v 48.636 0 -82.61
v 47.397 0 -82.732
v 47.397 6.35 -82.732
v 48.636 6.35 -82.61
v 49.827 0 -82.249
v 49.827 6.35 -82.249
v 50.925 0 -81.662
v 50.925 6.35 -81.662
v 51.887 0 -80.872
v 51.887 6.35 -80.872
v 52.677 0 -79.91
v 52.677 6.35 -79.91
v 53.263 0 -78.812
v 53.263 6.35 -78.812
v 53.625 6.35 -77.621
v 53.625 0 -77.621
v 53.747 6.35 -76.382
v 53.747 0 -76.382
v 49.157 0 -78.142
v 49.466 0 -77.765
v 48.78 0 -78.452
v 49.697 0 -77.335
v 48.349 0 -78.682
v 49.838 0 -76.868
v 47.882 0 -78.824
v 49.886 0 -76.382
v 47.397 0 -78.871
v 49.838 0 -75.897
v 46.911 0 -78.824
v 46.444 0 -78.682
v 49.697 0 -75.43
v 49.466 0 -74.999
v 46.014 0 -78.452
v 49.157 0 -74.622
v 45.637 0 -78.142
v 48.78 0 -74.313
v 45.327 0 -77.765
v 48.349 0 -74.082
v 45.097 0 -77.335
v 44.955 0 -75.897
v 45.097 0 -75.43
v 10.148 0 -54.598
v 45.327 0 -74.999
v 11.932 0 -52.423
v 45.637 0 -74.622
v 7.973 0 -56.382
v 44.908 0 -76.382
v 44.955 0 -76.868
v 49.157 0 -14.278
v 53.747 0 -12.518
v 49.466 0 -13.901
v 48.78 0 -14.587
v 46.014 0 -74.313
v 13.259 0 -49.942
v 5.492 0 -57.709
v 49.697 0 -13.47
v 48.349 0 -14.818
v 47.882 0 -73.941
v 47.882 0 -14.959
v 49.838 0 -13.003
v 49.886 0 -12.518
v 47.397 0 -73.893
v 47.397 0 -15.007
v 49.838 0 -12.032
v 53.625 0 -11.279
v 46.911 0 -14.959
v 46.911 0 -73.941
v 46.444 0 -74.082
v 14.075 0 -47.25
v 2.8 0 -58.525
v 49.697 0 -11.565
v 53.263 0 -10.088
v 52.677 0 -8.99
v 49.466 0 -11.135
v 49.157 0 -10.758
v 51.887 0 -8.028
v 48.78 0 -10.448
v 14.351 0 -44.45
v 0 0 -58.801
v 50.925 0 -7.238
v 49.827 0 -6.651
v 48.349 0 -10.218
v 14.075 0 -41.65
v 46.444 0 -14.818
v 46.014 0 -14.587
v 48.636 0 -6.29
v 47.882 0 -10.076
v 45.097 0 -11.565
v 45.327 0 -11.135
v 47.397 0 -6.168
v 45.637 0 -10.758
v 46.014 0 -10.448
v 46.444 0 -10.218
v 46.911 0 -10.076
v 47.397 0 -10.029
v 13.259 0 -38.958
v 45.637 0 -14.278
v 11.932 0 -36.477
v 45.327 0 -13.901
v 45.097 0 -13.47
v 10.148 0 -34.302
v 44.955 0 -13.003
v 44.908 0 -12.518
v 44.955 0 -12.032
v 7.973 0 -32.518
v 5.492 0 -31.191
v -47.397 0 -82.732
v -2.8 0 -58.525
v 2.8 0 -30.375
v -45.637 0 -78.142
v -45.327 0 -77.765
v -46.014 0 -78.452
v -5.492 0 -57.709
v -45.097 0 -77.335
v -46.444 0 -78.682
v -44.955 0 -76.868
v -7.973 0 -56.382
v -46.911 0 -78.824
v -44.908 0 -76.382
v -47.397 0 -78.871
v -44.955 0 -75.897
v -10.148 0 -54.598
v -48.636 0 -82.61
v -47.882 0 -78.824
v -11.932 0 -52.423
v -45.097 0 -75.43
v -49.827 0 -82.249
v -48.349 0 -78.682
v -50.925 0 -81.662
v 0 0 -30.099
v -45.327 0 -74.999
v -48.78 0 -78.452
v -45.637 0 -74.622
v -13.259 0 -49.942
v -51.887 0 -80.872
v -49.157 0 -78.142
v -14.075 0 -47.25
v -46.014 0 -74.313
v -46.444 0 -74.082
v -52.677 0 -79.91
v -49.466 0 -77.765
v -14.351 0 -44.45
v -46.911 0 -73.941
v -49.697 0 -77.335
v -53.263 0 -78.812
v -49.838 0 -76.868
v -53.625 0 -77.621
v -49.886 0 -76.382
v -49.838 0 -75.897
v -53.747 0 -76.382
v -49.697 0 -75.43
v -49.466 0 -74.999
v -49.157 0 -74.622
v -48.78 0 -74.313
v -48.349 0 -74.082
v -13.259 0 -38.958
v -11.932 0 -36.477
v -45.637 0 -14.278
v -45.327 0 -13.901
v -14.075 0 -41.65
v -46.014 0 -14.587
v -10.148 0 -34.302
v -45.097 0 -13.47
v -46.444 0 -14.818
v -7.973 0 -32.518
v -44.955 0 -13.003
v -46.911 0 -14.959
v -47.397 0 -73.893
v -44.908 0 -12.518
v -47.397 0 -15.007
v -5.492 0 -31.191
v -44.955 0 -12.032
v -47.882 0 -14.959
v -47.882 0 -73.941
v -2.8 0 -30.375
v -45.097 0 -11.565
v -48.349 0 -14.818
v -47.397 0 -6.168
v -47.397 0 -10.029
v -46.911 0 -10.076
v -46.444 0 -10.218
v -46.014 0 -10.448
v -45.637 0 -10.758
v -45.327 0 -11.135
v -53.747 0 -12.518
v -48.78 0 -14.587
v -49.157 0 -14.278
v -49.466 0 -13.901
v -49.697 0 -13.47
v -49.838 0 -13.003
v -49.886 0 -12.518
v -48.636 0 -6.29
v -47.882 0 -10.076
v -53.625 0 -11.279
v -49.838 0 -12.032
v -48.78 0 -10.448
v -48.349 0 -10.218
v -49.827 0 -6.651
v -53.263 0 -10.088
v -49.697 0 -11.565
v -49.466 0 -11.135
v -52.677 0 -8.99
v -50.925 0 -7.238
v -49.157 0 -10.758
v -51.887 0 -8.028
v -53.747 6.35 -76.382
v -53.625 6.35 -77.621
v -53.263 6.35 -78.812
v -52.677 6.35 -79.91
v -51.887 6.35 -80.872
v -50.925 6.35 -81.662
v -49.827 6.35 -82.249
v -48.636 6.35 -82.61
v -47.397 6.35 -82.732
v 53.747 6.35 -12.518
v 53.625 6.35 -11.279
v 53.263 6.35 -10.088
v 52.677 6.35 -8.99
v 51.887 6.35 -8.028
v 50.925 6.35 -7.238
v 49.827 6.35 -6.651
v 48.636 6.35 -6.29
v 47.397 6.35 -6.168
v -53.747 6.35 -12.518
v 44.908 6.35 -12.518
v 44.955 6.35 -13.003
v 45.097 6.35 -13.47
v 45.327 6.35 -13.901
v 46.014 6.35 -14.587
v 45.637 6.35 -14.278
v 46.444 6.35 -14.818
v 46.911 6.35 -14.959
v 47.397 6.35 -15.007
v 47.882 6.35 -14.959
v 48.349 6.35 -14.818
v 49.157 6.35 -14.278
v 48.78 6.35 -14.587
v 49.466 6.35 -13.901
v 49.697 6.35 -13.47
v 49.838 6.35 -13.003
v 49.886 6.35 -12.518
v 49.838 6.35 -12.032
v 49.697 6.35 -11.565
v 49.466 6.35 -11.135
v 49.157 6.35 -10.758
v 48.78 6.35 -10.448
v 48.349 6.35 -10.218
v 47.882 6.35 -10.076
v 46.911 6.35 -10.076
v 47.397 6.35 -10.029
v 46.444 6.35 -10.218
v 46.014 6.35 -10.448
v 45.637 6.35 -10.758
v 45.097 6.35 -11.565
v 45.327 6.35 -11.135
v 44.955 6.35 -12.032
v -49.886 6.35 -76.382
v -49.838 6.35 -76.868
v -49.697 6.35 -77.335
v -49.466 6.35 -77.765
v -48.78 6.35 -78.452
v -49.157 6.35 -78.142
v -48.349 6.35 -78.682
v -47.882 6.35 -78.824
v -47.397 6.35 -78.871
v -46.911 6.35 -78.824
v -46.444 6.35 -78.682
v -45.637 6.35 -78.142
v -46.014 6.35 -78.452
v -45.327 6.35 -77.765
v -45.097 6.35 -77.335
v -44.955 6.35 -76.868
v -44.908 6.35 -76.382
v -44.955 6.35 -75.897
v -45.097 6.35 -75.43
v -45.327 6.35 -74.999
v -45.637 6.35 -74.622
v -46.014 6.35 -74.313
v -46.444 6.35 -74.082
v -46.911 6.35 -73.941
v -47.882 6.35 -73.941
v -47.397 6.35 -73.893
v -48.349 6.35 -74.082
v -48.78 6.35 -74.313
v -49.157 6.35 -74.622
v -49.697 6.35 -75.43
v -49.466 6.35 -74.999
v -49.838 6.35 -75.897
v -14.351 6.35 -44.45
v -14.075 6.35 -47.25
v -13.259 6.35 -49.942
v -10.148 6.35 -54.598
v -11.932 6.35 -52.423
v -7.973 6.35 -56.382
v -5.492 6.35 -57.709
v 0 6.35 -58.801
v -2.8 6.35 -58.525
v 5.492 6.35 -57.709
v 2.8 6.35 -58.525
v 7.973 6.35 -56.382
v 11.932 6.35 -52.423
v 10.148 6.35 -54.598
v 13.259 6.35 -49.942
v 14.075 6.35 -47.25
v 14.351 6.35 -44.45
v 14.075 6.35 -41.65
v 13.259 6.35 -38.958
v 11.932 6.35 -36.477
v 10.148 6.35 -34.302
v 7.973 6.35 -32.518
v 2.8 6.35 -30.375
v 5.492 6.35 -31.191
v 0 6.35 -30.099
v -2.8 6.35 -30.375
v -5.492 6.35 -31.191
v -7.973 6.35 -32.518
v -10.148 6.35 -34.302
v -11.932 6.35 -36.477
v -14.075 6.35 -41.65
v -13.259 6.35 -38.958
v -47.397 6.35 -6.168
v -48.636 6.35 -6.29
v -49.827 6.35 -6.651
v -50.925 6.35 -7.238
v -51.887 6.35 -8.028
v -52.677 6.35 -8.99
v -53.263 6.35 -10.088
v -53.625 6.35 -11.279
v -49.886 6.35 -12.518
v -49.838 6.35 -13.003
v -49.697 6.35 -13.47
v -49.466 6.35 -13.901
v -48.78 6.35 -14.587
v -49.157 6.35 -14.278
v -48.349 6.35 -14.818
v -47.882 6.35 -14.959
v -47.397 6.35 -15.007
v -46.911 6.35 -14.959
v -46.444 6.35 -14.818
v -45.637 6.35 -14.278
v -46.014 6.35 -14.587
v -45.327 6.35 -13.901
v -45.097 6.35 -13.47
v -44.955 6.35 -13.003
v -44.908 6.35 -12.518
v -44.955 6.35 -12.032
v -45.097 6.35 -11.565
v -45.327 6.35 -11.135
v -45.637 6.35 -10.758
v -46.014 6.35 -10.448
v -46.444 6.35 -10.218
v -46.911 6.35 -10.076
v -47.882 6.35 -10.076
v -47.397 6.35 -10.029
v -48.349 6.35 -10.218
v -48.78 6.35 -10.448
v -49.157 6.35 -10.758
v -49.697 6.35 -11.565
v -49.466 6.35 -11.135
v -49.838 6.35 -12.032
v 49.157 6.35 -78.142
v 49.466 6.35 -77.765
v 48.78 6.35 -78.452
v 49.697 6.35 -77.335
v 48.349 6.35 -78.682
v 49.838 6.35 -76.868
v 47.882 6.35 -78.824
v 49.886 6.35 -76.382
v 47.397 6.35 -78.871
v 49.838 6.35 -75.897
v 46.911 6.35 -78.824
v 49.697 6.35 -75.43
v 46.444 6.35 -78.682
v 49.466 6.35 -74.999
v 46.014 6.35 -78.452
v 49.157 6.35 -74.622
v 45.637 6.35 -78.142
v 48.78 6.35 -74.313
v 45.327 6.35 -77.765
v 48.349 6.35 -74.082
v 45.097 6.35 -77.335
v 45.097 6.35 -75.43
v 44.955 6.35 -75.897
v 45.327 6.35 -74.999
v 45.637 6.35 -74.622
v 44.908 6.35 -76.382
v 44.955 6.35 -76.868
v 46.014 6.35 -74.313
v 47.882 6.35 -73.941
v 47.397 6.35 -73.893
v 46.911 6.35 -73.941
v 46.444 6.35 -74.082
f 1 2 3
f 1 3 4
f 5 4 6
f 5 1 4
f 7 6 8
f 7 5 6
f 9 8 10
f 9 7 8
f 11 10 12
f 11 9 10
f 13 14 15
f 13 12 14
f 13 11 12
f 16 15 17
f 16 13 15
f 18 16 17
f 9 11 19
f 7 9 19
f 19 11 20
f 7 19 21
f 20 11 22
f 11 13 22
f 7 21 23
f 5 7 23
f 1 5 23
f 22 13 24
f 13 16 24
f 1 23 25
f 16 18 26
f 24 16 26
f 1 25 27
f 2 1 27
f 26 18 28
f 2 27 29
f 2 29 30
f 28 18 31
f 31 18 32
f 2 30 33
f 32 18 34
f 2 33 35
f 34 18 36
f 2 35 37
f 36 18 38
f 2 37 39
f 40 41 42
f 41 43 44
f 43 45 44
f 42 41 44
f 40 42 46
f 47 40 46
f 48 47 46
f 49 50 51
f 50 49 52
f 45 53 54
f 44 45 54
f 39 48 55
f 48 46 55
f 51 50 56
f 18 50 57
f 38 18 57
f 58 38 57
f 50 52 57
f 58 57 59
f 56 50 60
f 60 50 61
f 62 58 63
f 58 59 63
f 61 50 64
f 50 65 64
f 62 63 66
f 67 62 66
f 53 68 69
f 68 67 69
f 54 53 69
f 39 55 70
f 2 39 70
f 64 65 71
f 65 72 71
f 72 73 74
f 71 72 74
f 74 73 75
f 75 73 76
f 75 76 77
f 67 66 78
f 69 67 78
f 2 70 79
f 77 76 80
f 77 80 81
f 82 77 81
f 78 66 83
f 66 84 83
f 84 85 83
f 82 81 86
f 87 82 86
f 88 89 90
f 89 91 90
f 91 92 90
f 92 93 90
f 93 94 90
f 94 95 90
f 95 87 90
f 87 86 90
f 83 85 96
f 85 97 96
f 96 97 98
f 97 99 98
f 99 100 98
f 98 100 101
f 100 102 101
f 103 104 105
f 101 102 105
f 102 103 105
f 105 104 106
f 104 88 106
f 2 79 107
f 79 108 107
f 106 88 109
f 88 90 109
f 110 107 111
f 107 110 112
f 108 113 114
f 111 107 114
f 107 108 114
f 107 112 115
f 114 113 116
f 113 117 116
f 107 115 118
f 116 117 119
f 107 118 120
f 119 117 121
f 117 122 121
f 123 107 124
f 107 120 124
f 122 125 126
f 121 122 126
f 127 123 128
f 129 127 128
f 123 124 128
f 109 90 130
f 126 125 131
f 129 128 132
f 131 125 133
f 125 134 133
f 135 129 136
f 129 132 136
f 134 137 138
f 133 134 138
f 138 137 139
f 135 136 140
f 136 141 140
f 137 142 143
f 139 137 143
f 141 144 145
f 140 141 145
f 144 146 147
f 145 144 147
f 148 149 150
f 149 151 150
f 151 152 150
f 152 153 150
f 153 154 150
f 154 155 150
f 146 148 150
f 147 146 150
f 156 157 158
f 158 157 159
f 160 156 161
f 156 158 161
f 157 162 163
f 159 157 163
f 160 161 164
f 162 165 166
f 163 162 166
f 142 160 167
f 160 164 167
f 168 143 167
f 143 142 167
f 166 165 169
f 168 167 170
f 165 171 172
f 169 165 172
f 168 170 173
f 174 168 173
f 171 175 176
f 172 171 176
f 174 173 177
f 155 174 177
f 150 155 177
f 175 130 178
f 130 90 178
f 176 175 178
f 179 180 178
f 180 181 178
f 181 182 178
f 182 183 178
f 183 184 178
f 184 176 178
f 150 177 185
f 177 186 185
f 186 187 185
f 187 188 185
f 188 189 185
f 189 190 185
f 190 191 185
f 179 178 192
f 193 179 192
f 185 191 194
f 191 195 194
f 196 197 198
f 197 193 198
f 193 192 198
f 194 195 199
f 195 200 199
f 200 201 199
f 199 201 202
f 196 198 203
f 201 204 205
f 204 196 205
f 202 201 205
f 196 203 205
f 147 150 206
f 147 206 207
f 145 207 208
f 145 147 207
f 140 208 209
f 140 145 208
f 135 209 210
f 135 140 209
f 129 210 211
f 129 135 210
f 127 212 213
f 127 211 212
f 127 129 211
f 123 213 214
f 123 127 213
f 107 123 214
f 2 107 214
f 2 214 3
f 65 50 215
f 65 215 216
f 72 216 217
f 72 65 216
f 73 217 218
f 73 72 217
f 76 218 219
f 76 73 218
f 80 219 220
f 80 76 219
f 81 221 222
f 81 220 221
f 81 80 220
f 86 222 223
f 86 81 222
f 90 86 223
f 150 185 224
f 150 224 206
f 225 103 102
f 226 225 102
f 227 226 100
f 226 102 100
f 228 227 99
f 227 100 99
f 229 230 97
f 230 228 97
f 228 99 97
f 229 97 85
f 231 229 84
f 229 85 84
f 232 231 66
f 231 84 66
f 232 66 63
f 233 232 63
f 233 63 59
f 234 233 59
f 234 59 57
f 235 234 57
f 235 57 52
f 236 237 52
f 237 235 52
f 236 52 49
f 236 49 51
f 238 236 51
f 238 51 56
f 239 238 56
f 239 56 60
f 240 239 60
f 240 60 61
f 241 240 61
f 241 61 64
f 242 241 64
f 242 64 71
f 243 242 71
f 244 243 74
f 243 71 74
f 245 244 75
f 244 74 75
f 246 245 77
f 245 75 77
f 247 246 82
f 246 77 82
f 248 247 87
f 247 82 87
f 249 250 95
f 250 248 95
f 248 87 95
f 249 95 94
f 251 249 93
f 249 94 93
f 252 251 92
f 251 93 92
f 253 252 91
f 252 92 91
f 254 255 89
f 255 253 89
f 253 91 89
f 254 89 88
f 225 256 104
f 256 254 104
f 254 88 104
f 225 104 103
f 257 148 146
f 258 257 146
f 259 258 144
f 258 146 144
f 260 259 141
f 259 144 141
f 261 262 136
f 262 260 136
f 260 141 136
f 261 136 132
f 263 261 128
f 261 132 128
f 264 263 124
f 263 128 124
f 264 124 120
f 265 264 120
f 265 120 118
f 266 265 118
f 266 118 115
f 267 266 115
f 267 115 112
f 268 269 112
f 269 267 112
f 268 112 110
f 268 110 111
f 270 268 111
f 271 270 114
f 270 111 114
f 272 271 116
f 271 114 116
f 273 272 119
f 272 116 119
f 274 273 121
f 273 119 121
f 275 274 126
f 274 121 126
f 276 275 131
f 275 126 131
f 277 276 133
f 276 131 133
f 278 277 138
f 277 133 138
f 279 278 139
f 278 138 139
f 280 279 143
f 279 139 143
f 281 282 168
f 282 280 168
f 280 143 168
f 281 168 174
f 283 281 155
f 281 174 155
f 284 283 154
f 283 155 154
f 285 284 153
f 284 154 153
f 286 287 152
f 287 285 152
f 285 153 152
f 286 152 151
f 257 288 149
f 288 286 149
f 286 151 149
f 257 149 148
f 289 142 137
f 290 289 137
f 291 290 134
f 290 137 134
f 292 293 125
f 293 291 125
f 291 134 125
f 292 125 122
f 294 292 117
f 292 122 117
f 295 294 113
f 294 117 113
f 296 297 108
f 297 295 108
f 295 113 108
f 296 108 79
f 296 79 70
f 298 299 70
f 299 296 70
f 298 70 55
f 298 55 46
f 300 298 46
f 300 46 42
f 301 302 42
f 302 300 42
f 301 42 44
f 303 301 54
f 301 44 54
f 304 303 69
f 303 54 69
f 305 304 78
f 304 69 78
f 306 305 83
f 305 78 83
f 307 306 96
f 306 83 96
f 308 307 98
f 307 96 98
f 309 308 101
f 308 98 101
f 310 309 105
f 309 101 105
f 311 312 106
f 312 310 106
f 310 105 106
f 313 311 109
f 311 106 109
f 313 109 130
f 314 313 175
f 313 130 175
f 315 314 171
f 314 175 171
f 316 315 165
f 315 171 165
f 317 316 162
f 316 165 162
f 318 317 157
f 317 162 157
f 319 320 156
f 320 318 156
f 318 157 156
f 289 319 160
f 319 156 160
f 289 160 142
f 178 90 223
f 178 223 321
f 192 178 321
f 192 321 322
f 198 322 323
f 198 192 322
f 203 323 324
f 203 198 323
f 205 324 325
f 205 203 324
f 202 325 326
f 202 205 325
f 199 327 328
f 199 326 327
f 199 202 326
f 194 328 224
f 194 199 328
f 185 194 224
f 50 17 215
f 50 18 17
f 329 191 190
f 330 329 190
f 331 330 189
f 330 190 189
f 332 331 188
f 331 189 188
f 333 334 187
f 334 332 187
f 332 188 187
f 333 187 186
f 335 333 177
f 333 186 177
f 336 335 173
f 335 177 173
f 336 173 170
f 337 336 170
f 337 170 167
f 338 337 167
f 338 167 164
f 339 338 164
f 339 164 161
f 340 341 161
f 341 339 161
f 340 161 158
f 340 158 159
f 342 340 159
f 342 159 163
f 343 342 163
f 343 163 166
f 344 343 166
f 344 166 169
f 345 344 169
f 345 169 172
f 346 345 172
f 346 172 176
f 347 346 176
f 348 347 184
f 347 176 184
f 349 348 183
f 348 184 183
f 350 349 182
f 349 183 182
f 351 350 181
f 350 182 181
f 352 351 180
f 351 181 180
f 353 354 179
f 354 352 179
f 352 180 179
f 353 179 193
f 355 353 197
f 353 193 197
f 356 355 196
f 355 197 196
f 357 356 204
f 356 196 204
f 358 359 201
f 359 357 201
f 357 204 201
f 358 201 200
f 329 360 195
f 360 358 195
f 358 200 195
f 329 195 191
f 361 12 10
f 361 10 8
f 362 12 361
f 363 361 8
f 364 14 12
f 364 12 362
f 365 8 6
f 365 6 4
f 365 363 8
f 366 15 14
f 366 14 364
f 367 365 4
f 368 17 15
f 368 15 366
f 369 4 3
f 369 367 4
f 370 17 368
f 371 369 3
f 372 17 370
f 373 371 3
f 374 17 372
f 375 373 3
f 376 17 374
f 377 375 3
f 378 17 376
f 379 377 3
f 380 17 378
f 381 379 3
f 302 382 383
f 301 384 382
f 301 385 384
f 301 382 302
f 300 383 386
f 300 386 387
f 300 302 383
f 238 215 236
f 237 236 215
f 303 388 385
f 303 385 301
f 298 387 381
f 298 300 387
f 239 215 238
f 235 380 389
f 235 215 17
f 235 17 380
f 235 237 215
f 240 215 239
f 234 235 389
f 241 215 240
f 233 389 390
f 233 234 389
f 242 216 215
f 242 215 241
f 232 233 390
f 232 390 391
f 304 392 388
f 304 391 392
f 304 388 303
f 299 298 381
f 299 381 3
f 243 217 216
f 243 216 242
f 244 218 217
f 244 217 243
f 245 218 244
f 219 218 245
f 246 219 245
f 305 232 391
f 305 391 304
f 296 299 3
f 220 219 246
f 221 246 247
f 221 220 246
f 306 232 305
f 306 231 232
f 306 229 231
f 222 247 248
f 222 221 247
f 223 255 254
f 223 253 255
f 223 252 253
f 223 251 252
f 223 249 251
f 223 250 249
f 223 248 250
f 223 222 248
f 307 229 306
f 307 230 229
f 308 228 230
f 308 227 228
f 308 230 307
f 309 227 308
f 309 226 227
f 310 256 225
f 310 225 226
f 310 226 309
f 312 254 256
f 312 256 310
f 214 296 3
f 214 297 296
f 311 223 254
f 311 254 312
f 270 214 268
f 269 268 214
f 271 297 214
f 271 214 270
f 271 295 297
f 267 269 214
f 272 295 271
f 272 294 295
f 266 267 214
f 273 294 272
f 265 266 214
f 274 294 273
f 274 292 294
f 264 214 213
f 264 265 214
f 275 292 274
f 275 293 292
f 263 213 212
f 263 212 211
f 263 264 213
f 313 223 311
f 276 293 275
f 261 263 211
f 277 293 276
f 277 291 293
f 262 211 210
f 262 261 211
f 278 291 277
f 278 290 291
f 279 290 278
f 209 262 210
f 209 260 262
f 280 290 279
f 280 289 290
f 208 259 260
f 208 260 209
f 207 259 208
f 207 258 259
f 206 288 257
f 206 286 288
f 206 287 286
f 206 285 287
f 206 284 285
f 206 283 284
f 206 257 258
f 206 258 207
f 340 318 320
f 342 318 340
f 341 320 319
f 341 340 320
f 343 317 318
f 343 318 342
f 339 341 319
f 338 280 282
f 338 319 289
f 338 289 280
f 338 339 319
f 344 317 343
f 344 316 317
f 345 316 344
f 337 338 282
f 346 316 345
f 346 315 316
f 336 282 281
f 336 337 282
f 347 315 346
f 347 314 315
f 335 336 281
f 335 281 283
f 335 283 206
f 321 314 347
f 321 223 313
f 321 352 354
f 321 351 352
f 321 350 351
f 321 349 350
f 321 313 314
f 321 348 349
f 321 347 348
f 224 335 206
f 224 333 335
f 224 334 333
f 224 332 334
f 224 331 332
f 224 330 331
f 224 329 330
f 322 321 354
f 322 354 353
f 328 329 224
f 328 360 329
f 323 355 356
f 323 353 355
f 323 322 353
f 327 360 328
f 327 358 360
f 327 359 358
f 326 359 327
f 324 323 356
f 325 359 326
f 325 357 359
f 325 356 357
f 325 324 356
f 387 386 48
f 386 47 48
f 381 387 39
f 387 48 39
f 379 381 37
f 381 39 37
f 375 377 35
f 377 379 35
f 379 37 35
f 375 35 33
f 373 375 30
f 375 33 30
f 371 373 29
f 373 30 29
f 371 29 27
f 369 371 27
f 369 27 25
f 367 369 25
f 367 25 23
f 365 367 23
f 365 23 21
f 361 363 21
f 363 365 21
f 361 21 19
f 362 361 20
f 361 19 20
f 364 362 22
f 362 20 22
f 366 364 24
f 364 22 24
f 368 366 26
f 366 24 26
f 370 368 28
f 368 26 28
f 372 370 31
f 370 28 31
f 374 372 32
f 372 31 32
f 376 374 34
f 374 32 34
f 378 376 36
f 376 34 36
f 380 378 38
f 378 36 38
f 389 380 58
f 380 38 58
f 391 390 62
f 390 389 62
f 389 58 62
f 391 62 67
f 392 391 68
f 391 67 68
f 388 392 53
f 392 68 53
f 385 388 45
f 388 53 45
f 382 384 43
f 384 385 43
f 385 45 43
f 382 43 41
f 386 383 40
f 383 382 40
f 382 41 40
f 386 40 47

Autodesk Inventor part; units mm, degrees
ref_plane "YZ Plane" through (0, 0, 0) normal (1, 0, 0) x (0, 1, 0)
ref_plane "XZ Plane" through (0, 0, 0) normal (0, 1, 0) x (-1, 0, 0)
ref_plane "XY Plane" through (0, 0, 0) normal (0, 0, 1) x (1, 0, 0)
sketch "Sketch1" plane through (0, 0, 0) normal (0, 1, 0) x (-1, 0, 0)
  point P0 (0, 0)
sketch "Sketch2" plane through (0, 0, 0) normal (0, 1, 0) x (-1, 0, 0)
  circle A0 centre (0, 0) radius 6.35 construction
  circle A1 centre (0, -44.45) radius 38.1 construction
  circle A2 centre (0, 0) radius 25.4 construction
  circle A3 centre (17.9605, -17.9605) radius 2.4892 construction
  circle A4 centre (25.4, 0) radius 2.4892 construction
  circle A5 centre (17.9605, 17.9605) radius 2.4892 construction
  circle A6 centre (0, 25.4) radius 2.4892 construction
  circle A7 centre (-17.9605, 17.9605) radius 2.4892 construction
  circle A8 centre (-25.4, 0) radius 2.4892 construction
  circle A9 centre (-17.9605, -17.9605) radius 2.4892 construction
  circle A10 centre (0, -25.4) radius 2.4892 construction
  circle A11 centre (0, -88.9) radius 25.4 construction
  circle A12 centre (0, -88.9) radius 6.35 construction
  circle A13 centre (-17.9605, -70.9395) radius 2.4892 construction
  circle A14 centre (-25.4, -88.9) radius 2.4892 construction
  circle A15 centre (-17.9605, -106.8605) radius 2.4892 construction
  circle A16 centre (0, -114.3) radius 2.4892 construction
  circle A17 centre (17.9605, -106.8605) radius 2.4892 construction
  circle A18 centre (25.4, -88.9) radius 2.4892 construction
  circle A19 centre (17.9605, -70.9395) radius 2.4892 construction
  circle A20 centre (0, -63.5) radius 2.4892 construction
  circle A21 centre (0, 0) radius 9.525 construction
  circle A22 centre (0, -88.9) radius 9.525 construction
  circle A23 centre (47.3968, -12.5178) radius 6.35 construction
  circle A24 centre (47.3968, -76.3822) radius 6.35 construction
  circle A25 centre (-47.3968, -76.3822) radius 6.35 construction
  circle A26 centre (0, 0) radius 29.972 construction
  circle A27 centre (0, -88.9) radius 29.972 construction
  circle A28 centre (-47.3968, -12.5178) radius 6.35 construction
  circle A29 centre (47.3968, -12.5178) radius 2.4892
  circle A30 centre (47.3968, -76.3822) radius 2.4892
  circle A31 centre (-47.3968, -12.5178) radius 2.4892
  circle A32 centre (-47.3968, -76.3822) radius 2.4892
  line L0 (42.1305, -72.8341) -> (31.5979, -65.7381) construction
  line L1 (41.2573, -78.0036) -> (28.9784, -81.2466) construction
  line L2 (-41.2573, -78.0036) -> (-28.9784, -81.2466) construction
  line L3 (-42.1305, -72.8341) -> (-31.5979, -65.7381) construction
  line L4 (-41.2573, -10.8964) -> (-28.9784, -7.6534) construction
  line L5 (-42.1305, -16.0659) -> (-31.5979, -23.1619) construction
  line L6 (41.2573, -10.8964) -> (28.9784, -7.6534) construction
  line L7 (42.1305, -16.0659) -> (31.5979, -23.1619) construction
  circle A33 centre (0, -44.45) radius 14.351
  line L8 (47.3968, -82.7322) -> (-47.3968, -82.7322)
  line L9 (-53.7468, -76.3822) -> (-53.7468, -12.5178)
  line L10 (-47.3968, -6.1678) -> (47.3968, -6.1678)
  line L11 (53.7468, -12.5178) -> (53.7468, -76.3822)
  arc A34 (53.7468, -12.5178) -> (47.3968, -6.1678) centre (47.3968, -12.5178) ccw
  arc A35 (-53.7468, -76.3822) -> (-47.3968, -82.7322) centre (-47.3968, -76.3822) ccw
  arc A36 (-47.3968, -6.1678) -> (-53.7468, -12.5178) centre (-47.3968, -12.5178) ccw
  arc A37 (47.3968, -82.7322) -> (53.7468, -76.3822) centre (47.3968, -76.3822) ccw
  point P0 (-20.6699, 21.7043)
  point P1 (-20.6699, -110.6043)
  point P2 (51.7761, -80.9805)
  point P3 (51.7761, -7.9195)
  point P4 (-47.3968, -82.7322)
  dimension "d2" = 50.8
  dimension "d0" = 12.7
  dimension "d1" = 76.2
  dimension "d3" = 4.9784
  dimension "d6" = 360
  dimension "d8" = 4.9784
  dimension "d11" = 360
  dimension "d13" = 19.05
  dimension "d14" = 19.05
  dimension "d15" = 59.944
  dimension "d16" = 59.944
  dimension "d17" = 12.7
  dimension "d18" = 4.9784
  dimension "d24" = 12.7
  dimension "d25" = 28.702
extrude "Extrusion2" add sketch "Sketch2" along normal blind 6.35
properties part number "Top Plate" material "Aluminum 6061"
